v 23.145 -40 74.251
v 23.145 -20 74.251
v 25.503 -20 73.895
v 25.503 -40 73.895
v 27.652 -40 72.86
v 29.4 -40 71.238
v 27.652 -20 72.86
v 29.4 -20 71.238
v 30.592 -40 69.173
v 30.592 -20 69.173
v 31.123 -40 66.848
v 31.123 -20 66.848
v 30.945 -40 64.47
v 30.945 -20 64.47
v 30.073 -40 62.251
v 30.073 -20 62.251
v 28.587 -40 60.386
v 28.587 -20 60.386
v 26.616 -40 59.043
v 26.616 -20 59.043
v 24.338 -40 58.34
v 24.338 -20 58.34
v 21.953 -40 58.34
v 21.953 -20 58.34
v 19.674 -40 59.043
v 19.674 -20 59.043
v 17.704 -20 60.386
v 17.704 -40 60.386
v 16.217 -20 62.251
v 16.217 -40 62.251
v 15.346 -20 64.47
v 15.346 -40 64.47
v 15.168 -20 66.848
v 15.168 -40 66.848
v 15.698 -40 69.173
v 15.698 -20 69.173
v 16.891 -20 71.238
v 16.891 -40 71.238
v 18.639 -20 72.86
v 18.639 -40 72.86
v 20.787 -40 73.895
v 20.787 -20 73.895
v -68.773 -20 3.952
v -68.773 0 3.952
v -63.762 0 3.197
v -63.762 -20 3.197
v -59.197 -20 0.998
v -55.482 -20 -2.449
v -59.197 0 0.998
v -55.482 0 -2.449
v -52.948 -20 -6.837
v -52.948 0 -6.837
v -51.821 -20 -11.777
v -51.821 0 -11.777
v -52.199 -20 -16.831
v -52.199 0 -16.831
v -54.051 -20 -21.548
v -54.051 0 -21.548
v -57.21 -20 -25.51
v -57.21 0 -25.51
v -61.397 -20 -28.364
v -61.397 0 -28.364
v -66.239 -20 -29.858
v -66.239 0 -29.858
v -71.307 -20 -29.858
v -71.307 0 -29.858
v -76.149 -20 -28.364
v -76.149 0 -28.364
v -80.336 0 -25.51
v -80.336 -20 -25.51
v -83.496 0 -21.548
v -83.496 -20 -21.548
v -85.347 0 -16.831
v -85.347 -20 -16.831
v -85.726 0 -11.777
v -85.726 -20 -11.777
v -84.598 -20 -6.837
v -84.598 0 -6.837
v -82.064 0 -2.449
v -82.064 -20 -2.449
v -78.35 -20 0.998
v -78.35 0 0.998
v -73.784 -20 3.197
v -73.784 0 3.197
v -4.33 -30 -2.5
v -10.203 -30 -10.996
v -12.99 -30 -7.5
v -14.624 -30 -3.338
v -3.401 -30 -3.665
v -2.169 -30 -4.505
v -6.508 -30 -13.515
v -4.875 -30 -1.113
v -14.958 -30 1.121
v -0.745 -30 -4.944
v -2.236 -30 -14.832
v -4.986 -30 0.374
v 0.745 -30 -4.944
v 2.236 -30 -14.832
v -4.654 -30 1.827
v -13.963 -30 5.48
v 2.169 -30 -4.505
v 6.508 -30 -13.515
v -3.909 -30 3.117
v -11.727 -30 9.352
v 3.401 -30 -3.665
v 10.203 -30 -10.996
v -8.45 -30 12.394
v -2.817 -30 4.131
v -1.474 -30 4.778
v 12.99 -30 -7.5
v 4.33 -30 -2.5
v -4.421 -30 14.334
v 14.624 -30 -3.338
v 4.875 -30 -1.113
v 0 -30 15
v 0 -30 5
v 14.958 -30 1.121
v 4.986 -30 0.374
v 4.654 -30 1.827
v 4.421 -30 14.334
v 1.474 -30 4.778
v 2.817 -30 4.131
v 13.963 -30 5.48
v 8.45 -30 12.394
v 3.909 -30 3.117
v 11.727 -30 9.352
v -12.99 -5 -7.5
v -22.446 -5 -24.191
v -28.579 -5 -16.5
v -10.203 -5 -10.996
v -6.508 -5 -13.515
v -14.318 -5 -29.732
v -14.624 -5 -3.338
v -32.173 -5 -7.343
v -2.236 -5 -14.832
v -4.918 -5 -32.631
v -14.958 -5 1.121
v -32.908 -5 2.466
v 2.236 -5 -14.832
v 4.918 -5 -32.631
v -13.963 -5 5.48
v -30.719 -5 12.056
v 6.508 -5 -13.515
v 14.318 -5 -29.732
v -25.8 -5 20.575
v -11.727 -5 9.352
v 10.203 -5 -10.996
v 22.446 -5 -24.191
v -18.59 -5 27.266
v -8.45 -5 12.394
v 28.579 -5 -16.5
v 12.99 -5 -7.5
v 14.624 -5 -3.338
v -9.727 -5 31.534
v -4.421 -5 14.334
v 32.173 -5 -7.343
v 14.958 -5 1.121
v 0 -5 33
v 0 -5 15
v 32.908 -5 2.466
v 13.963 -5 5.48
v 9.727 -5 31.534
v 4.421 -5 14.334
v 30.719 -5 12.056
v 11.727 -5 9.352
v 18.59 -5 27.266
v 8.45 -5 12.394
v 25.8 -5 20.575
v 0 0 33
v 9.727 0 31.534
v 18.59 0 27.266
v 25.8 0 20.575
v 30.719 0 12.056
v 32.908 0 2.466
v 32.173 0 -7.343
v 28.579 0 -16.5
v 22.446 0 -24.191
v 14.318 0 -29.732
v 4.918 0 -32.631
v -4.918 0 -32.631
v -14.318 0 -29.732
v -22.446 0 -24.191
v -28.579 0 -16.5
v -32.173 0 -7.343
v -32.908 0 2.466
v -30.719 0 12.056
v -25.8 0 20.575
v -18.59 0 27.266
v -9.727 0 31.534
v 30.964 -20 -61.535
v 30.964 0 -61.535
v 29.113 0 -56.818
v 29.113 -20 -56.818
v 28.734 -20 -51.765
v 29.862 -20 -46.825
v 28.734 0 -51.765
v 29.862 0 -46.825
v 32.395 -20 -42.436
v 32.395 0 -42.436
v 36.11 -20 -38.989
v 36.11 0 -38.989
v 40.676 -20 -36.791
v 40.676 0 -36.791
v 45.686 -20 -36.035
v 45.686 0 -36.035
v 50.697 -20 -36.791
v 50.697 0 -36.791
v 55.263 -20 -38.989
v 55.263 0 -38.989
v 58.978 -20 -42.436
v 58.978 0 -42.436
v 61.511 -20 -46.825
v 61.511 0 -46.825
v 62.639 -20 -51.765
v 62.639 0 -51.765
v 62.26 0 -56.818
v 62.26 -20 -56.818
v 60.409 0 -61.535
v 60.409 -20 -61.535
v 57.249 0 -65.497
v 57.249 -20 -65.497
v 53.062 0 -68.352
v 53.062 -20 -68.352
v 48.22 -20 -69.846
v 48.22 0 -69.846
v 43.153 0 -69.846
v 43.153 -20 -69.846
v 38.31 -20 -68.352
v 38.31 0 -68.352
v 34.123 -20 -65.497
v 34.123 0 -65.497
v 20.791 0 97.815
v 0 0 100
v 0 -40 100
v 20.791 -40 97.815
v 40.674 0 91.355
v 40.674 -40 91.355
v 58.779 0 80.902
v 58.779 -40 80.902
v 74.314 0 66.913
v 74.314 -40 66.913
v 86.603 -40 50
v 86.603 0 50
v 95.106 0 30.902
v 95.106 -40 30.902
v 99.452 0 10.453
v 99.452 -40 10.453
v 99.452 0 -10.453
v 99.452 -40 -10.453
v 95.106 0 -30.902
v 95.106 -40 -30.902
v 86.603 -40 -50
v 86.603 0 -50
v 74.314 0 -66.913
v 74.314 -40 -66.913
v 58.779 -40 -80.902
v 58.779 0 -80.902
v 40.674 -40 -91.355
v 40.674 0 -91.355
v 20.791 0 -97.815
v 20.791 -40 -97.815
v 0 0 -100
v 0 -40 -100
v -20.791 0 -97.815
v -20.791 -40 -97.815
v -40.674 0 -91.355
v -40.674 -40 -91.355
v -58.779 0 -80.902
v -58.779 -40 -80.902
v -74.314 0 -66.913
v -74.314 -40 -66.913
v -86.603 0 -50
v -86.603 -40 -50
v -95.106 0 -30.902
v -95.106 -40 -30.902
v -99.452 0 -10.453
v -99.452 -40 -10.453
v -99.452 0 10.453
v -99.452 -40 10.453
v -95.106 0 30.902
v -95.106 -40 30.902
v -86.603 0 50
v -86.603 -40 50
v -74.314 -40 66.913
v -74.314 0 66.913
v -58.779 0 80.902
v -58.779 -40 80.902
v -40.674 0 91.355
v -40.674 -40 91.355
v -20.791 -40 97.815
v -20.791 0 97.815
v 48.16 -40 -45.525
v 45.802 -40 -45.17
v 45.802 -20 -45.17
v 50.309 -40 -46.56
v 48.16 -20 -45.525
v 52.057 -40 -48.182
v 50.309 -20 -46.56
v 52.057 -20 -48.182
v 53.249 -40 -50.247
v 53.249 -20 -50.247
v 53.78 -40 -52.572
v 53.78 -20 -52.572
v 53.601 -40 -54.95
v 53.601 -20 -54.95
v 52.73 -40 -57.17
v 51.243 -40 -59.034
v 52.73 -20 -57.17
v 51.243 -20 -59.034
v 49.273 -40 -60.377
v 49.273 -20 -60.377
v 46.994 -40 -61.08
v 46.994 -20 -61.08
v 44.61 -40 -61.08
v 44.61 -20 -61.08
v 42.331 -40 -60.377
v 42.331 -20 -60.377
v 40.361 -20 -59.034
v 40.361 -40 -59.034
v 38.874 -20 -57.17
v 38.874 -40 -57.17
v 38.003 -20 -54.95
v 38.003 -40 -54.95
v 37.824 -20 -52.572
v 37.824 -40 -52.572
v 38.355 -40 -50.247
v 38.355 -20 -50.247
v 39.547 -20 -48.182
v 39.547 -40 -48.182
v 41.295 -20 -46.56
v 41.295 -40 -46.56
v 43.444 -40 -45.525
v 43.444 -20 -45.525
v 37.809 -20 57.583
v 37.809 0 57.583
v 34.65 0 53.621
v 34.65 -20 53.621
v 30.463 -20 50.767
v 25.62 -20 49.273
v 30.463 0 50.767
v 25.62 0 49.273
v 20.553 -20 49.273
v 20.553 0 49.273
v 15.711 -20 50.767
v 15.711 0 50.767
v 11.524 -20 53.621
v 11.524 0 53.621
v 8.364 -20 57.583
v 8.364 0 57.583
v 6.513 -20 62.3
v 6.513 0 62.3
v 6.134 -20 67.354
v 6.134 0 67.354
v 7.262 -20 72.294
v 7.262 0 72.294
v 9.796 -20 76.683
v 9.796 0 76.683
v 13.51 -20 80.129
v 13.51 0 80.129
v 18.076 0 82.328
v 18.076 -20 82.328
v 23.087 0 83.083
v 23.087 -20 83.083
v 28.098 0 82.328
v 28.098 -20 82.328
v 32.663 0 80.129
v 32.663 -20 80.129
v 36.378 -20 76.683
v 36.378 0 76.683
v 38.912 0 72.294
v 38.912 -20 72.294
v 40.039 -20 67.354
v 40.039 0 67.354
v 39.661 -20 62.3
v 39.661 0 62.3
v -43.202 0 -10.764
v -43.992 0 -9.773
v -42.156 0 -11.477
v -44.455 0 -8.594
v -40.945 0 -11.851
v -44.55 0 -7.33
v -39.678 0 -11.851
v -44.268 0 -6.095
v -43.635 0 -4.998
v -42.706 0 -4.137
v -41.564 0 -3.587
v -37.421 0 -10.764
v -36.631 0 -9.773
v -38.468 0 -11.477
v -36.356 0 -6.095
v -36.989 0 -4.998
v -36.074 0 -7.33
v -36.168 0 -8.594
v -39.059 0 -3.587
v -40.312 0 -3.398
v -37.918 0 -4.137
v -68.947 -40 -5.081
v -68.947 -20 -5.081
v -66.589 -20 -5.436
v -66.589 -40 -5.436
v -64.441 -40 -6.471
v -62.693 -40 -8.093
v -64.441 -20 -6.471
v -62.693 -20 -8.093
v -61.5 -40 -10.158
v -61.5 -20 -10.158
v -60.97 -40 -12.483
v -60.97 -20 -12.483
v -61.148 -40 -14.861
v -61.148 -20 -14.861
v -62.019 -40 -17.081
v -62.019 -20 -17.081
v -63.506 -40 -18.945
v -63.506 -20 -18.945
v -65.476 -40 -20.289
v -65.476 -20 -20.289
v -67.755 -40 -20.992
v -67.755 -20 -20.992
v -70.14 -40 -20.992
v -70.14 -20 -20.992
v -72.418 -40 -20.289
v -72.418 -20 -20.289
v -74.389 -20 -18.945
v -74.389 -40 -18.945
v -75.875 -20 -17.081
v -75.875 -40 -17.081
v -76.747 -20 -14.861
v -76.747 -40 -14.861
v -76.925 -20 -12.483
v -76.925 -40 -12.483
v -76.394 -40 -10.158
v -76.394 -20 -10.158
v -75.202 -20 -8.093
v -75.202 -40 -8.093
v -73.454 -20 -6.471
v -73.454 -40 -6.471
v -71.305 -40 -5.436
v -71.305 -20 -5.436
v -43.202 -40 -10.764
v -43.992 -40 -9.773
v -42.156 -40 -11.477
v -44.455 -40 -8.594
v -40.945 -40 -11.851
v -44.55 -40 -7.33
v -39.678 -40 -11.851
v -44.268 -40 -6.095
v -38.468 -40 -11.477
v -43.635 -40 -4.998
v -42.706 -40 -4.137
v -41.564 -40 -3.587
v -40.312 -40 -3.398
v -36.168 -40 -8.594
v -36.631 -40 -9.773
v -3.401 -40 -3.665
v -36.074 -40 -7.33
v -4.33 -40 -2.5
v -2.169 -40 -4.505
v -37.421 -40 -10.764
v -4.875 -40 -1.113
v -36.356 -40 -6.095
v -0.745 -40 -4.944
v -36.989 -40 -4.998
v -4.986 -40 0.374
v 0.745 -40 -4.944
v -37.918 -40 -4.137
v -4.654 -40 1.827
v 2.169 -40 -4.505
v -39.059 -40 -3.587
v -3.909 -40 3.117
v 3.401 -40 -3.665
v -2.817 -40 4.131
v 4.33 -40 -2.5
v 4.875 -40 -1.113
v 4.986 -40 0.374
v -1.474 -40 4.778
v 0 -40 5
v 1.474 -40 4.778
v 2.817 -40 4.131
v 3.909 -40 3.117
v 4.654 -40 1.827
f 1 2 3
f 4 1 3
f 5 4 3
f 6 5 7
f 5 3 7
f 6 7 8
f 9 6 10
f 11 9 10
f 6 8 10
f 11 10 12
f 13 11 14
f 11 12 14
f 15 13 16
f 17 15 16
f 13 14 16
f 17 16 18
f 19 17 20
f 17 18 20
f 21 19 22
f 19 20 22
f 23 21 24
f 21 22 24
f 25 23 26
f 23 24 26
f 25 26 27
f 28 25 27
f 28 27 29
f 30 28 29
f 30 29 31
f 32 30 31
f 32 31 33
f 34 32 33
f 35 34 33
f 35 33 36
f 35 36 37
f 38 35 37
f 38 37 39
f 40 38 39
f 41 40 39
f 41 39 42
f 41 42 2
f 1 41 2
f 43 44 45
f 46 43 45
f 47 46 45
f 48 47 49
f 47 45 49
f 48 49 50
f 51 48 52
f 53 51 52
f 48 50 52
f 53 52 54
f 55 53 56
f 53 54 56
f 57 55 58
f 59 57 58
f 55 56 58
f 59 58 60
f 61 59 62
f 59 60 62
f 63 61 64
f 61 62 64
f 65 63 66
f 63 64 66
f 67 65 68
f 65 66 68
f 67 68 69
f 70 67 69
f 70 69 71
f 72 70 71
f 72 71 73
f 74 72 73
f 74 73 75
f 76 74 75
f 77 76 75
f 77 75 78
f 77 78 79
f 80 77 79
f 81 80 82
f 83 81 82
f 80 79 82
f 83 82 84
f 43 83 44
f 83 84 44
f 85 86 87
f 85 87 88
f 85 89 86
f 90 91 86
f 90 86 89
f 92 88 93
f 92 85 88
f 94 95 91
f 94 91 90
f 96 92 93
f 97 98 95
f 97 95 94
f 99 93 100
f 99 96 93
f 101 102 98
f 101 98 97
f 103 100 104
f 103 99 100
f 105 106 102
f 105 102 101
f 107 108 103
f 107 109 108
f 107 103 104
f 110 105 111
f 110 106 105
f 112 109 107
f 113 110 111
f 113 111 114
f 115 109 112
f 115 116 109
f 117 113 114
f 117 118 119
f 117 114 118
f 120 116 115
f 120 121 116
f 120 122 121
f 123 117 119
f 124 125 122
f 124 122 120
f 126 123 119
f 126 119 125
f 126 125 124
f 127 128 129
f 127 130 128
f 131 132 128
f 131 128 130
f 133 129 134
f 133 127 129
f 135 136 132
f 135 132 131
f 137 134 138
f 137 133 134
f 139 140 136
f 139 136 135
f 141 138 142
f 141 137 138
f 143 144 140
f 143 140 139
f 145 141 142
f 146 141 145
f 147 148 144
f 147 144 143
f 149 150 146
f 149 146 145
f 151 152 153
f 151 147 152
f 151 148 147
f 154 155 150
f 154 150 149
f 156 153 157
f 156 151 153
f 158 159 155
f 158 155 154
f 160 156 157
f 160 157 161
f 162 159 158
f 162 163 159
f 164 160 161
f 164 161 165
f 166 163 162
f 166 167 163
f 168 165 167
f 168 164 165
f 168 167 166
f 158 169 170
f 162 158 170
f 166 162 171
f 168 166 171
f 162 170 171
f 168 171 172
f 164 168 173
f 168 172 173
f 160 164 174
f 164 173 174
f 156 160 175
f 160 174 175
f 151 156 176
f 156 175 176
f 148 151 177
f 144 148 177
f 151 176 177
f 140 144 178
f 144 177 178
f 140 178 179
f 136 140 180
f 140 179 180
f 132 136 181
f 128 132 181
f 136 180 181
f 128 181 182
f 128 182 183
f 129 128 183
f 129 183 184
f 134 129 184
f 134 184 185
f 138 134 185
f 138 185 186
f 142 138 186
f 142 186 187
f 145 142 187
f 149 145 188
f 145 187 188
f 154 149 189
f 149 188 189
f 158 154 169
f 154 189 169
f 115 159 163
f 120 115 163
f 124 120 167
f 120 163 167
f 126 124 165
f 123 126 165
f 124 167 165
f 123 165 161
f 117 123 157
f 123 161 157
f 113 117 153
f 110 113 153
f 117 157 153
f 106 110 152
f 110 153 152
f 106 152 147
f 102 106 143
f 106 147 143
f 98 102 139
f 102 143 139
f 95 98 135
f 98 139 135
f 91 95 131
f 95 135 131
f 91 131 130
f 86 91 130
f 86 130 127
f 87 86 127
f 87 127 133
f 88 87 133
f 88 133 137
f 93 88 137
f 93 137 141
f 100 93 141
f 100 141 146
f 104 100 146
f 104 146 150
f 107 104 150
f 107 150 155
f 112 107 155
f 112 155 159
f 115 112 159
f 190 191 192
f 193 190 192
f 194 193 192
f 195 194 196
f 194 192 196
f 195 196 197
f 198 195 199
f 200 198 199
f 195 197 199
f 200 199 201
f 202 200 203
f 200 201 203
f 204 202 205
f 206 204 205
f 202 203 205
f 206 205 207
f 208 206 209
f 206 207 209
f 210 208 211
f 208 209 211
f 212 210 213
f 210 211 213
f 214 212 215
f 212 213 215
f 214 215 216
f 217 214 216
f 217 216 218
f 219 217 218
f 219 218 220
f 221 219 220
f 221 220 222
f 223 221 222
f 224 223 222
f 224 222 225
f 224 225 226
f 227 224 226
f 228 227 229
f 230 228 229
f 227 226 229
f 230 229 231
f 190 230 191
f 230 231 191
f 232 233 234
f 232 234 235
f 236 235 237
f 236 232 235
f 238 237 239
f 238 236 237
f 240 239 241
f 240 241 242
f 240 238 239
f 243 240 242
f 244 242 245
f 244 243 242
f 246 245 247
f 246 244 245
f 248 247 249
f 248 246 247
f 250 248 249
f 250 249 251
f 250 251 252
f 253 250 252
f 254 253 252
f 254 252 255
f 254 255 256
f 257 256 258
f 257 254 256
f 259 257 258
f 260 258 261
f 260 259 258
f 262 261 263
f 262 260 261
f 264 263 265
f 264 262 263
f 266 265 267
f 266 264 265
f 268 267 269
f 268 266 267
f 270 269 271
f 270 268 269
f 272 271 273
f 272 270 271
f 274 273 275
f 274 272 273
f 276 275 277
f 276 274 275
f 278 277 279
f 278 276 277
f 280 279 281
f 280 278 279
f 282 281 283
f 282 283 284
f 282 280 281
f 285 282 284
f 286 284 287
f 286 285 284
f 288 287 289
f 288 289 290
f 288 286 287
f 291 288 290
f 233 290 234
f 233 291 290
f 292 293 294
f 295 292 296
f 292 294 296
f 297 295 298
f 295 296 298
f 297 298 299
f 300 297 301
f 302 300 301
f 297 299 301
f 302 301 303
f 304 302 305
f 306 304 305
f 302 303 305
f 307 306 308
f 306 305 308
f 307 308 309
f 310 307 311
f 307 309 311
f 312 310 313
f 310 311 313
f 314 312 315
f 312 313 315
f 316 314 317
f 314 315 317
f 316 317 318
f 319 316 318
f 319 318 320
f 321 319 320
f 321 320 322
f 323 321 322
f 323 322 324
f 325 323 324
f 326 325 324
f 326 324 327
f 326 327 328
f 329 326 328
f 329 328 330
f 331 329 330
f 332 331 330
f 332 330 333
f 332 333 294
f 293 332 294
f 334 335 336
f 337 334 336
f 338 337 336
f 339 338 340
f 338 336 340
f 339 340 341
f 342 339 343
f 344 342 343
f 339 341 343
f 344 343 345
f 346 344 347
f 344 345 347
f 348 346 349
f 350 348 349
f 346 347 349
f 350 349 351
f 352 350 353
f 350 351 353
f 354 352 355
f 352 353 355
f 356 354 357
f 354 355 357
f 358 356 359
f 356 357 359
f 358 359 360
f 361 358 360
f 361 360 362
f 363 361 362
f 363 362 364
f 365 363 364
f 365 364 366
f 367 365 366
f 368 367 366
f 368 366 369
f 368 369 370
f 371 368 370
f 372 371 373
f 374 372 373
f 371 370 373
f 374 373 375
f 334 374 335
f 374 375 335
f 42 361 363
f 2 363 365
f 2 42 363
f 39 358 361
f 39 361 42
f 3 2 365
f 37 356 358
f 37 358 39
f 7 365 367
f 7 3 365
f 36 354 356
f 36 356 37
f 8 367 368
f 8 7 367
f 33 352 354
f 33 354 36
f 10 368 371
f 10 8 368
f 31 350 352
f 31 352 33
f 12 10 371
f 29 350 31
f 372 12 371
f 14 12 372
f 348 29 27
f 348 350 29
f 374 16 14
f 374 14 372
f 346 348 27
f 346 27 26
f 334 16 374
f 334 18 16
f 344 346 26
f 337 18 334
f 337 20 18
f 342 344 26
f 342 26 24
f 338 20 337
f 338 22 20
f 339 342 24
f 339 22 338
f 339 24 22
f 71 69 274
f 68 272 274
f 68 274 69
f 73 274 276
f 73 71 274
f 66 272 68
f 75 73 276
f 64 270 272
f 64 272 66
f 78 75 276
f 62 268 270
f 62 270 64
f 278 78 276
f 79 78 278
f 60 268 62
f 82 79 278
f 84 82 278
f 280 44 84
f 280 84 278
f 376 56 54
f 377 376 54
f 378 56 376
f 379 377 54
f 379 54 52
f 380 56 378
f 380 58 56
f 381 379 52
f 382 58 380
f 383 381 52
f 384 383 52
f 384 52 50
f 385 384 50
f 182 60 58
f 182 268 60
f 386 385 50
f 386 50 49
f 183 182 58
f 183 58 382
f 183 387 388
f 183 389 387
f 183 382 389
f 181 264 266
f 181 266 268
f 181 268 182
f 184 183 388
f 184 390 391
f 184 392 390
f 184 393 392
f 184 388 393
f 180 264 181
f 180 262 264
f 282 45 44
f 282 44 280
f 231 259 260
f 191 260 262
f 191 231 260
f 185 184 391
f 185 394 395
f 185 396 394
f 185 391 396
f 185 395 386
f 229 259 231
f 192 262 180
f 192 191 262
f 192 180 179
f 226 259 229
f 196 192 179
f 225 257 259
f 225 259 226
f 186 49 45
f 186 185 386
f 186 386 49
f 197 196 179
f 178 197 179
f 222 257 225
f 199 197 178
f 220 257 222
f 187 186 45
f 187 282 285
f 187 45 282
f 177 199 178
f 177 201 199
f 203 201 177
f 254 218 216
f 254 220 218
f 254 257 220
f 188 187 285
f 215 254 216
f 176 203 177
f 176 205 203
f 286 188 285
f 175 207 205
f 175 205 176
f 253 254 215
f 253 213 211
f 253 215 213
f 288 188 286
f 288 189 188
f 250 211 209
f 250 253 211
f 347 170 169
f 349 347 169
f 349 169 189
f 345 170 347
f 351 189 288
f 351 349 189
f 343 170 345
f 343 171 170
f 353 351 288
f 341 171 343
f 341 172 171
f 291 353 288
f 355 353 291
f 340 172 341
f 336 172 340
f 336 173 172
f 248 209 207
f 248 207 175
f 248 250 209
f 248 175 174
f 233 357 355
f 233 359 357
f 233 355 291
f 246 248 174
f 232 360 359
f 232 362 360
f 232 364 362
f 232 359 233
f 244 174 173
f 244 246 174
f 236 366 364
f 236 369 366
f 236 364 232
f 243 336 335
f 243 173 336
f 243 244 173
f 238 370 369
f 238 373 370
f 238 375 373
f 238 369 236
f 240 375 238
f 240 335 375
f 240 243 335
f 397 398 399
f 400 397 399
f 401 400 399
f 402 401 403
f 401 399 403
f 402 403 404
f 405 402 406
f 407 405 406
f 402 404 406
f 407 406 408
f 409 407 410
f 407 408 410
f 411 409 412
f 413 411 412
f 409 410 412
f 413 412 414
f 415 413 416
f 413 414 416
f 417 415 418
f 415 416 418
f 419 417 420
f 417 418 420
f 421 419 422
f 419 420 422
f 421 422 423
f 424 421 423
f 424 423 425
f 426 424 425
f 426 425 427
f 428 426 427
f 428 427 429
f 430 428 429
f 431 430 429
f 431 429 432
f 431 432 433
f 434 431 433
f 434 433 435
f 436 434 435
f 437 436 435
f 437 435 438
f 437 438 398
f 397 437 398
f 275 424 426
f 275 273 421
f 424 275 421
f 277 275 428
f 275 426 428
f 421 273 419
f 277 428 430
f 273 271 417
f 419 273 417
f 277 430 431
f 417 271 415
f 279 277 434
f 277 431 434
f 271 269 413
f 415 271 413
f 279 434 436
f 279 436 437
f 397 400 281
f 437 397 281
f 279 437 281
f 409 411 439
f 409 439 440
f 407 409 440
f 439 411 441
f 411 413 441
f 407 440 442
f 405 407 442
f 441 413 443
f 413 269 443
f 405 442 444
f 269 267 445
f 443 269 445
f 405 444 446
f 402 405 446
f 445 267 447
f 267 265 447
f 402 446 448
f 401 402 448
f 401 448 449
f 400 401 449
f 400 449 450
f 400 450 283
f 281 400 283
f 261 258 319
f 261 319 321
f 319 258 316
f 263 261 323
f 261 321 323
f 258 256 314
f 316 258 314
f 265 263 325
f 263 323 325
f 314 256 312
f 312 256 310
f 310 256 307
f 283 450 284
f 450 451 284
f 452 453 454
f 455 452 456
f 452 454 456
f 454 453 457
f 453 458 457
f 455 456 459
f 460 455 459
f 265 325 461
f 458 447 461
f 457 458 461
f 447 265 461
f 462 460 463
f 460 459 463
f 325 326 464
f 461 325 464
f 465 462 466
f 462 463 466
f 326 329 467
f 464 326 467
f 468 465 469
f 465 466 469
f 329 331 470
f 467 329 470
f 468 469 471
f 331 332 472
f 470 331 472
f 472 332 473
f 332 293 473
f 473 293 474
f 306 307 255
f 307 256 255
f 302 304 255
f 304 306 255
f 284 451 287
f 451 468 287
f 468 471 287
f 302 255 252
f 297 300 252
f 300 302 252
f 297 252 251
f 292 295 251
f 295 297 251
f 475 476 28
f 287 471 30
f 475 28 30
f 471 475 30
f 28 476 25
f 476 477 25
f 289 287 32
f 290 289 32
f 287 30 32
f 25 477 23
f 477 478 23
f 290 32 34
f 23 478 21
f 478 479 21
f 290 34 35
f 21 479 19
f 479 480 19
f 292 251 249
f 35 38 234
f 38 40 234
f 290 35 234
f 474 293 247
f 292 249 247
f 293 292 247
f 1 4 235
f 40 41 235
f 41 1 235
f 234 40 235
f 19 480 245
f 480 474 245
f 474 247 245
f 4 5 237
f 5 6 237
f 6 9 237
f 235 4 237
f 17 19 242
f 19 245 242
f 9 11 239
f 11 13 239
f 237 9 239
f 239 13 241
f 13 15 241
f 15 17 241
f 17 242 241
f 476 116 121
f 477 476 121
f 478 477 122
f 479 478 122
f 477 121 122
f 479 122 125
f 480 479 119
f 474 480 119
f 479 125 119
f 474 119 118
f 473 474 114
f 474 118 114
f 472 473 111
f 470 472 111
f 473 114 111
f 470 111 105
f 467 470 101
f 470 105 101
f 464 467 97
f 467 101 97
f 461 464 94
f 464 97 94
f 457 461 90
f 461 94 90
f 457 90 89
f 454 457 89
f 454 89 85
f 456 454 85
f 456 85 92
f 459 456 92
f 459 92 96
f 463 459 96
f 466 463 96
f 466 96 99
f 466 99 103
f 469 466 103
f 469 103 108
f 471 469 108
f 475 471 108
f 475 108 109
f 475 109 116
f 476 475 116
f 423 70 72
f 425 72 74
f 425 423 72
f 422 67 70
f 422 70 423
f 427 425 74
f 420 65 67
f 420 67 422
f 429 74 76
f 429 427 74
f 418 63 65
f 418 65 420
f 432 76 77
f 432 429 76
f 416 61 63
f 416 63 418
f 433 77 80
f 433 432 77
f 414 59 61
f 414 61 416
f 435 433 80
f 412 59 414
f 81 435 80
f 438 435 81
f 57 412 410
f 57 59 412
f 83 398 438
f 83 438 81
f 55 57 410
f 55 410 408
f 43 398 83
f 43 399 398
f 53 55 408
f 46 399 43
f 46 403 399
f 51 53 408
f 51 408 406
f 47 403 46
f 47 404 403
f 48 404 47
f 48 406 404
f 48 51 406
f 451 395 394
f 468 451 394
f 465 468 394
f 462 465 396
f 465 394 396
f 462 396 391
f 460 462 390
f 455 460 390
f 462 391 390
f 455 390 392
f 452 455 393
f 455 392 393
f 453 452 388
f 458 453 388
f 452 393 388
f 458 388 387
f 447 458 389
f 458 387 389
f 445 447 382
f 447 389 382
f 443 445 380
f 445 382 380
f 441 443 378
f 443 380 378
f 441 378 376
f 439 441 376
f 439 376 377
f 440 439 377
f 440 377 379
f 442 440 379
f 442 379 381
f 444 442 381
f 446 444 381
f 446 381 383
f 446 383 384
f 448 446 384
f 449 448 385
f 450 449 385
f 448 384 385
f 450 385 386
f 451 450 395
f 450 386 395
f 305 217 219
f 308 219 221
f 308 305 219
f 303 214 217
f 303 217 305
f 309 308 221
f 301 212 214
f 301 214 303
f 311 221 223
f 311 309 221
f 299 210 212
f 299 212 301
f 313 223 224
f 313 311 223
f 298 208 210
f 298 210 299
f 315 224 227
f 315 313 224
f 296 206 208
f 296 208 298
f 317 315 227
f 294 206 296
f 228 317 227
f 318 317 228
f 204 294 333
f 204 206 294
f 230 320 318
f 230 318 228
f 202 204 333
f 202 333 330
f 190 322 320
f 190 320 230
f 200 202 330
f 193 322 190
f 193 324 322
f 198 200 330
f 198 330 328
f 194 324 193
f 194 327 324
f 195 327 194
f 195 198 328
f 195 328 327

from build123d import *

# Parameters (mm, degrees)
ESQUISSE1_R                  = 100
ESQUISSE1_R_2                = 4.25
ESQUISSE1_R_3                = 8
BOSS_EXTRU_1_DEPTH           = 40
ESQUISSE3_R                  = 5
ENL_V_MAT_EXTRU_2_DEPTH      = 41
ESQUISSE5_R                  = 15
ENL_V_MAT_EXTRU_3_DEPTH      = 30
ESQUISSE6_R                  = 33
ENL_V_MAT_EXTRU_4_DEPTH      = 5
ESQUISSE8_R                  = 17
ENL_V_MAT_EXTRU_5_DEPTH      = 20
R_P_TITION_CIRCULAIRE1_COUNT = 3


with BuildPart() as part:
    # Esquisse1 → Boss.-Extru.1 (new body)
    with BuildSketch(Plane(origin=(0, 0, 0), x_dir=(1, 0, 0), z_dir=(0, 1, 0))):
        with Locations(Location((0, 0, 0), (0, 0, 270))):  # turned: the seam where the file's is
            Circle(ESQUISSE1_R)
        with Locations(Location((-40.311740852, 7.648092634, 0), (0, 0, 270))):  # turned: the seam where the file's is
            Circle(ESQUISSE1_R_2, mode=Mode.SUBTRACT)
        with Locations(Location((-68.947262615, 13.080929779, 0), (0, 0, 270))):  # turned: the seam where the file's is
            Circle(ESQUISSE1_R_3, mode=Mode.SUBTRACT)
        with Locations(Location((45.802048801, 53.169616056, 0), (0, 0, 270))):  # turned: the seam where the file's is
            Circle(ESQUISSE1_R_3, mode=Mode.SUBTRACT)
        with Locations(Location((23.145213813, -66.250545836, 0), (0, 0, 270))):  # turned: the seam where the file's is
            Circle(ESQUISSE1_R_3, mode=Mode.SUBTRACT)
    extrude(amount=-BOSS_EXTRU_1_DEPTH)

    # Esquisse3 → Enlèv. mat.-Extru.2 (cut, through all)
    with BuildSketch(Plane(origin=(0, 0, 0), x_dir=(1, 0, 0), z_dir=(0, 1, 0))):
        with Locations(Location((0, 0, 0), (0, 0, 270))):  # turned: the seam where the file's is
            Circle(ESQUISSE3_R)
    extrude(amount=-ENL_V_MAT_EXTRU_2_DEPTH, mode=Mode.SUBTRACT)

    # Esquisse5 → Enlèv. mat.-Extru.3 (cut)
    with BuildSketch(Plane(origin=(0, 0, 0), x_dir=(1, 0, 0), z_dir=(0, 1, 0))):
        with Locations(Location((0, 0, 0), (0, 0, 270))):  # turned: the seam where the file's is
            Circle(ESQUISSE5_R)
    extrude(amount=-ENL_V_MAT_EXTRU_3_DEPTH, mode=Mode.SUBTRACT)

    # Esquisse6 → Enlèv. mat.-Extru.4 (cut)
    with BuildSketch(Plane(origin=(0, 0, 0), x_dir=(1, 0, 0), z_dir=(0, 1, 0))):
        with Locations(Location((0, 0, 0), (0, 0, 270))):  # turned: the seam where the file's is
            Circle(ESQUISSE6_R)
    extrude(amount=-ENL_V_MAT_EXTRU_4_DEPTH, mode=Mode.SUBTRACT)

    # Esquisse8 → Enlèv. mat.-Extru.5 (cut)
    with BuildSketch(Plane(origin=(0, 0, 0), x_dir=(1, 0, 0), z_dir=(0, 1, 0))):
        with Locations(Location((-68.773193764, 13.047904793, 0), (0, 0, 270))):  # turned: the seam where the file's is
            Circle(ESQUISSE8_R)
    enl_v_mat_extru_5 = extrude(amount=-ENL_V_MAT_EXTRU_5_DEPTH, mode=Mode.SUBTRACT)

    # Répétition circulaire1: Enlèv. mat.-Extru.5 ×3 about axis
    r_p_tition_circulaire1_axis = Axis((0, 0, 0), (0, 1, 0))
    for i in range(1, R_P_TITION_CIRCULAIRE1_COUNT):
        add(enl_v_mat_extru_5.rotate(r_p_tition_circulaire1_axis, i * 360 / R_P_TITION_CIRCULAIRE1_COUNT), mode=Mode.SUBTRACT)


solid = part.part
